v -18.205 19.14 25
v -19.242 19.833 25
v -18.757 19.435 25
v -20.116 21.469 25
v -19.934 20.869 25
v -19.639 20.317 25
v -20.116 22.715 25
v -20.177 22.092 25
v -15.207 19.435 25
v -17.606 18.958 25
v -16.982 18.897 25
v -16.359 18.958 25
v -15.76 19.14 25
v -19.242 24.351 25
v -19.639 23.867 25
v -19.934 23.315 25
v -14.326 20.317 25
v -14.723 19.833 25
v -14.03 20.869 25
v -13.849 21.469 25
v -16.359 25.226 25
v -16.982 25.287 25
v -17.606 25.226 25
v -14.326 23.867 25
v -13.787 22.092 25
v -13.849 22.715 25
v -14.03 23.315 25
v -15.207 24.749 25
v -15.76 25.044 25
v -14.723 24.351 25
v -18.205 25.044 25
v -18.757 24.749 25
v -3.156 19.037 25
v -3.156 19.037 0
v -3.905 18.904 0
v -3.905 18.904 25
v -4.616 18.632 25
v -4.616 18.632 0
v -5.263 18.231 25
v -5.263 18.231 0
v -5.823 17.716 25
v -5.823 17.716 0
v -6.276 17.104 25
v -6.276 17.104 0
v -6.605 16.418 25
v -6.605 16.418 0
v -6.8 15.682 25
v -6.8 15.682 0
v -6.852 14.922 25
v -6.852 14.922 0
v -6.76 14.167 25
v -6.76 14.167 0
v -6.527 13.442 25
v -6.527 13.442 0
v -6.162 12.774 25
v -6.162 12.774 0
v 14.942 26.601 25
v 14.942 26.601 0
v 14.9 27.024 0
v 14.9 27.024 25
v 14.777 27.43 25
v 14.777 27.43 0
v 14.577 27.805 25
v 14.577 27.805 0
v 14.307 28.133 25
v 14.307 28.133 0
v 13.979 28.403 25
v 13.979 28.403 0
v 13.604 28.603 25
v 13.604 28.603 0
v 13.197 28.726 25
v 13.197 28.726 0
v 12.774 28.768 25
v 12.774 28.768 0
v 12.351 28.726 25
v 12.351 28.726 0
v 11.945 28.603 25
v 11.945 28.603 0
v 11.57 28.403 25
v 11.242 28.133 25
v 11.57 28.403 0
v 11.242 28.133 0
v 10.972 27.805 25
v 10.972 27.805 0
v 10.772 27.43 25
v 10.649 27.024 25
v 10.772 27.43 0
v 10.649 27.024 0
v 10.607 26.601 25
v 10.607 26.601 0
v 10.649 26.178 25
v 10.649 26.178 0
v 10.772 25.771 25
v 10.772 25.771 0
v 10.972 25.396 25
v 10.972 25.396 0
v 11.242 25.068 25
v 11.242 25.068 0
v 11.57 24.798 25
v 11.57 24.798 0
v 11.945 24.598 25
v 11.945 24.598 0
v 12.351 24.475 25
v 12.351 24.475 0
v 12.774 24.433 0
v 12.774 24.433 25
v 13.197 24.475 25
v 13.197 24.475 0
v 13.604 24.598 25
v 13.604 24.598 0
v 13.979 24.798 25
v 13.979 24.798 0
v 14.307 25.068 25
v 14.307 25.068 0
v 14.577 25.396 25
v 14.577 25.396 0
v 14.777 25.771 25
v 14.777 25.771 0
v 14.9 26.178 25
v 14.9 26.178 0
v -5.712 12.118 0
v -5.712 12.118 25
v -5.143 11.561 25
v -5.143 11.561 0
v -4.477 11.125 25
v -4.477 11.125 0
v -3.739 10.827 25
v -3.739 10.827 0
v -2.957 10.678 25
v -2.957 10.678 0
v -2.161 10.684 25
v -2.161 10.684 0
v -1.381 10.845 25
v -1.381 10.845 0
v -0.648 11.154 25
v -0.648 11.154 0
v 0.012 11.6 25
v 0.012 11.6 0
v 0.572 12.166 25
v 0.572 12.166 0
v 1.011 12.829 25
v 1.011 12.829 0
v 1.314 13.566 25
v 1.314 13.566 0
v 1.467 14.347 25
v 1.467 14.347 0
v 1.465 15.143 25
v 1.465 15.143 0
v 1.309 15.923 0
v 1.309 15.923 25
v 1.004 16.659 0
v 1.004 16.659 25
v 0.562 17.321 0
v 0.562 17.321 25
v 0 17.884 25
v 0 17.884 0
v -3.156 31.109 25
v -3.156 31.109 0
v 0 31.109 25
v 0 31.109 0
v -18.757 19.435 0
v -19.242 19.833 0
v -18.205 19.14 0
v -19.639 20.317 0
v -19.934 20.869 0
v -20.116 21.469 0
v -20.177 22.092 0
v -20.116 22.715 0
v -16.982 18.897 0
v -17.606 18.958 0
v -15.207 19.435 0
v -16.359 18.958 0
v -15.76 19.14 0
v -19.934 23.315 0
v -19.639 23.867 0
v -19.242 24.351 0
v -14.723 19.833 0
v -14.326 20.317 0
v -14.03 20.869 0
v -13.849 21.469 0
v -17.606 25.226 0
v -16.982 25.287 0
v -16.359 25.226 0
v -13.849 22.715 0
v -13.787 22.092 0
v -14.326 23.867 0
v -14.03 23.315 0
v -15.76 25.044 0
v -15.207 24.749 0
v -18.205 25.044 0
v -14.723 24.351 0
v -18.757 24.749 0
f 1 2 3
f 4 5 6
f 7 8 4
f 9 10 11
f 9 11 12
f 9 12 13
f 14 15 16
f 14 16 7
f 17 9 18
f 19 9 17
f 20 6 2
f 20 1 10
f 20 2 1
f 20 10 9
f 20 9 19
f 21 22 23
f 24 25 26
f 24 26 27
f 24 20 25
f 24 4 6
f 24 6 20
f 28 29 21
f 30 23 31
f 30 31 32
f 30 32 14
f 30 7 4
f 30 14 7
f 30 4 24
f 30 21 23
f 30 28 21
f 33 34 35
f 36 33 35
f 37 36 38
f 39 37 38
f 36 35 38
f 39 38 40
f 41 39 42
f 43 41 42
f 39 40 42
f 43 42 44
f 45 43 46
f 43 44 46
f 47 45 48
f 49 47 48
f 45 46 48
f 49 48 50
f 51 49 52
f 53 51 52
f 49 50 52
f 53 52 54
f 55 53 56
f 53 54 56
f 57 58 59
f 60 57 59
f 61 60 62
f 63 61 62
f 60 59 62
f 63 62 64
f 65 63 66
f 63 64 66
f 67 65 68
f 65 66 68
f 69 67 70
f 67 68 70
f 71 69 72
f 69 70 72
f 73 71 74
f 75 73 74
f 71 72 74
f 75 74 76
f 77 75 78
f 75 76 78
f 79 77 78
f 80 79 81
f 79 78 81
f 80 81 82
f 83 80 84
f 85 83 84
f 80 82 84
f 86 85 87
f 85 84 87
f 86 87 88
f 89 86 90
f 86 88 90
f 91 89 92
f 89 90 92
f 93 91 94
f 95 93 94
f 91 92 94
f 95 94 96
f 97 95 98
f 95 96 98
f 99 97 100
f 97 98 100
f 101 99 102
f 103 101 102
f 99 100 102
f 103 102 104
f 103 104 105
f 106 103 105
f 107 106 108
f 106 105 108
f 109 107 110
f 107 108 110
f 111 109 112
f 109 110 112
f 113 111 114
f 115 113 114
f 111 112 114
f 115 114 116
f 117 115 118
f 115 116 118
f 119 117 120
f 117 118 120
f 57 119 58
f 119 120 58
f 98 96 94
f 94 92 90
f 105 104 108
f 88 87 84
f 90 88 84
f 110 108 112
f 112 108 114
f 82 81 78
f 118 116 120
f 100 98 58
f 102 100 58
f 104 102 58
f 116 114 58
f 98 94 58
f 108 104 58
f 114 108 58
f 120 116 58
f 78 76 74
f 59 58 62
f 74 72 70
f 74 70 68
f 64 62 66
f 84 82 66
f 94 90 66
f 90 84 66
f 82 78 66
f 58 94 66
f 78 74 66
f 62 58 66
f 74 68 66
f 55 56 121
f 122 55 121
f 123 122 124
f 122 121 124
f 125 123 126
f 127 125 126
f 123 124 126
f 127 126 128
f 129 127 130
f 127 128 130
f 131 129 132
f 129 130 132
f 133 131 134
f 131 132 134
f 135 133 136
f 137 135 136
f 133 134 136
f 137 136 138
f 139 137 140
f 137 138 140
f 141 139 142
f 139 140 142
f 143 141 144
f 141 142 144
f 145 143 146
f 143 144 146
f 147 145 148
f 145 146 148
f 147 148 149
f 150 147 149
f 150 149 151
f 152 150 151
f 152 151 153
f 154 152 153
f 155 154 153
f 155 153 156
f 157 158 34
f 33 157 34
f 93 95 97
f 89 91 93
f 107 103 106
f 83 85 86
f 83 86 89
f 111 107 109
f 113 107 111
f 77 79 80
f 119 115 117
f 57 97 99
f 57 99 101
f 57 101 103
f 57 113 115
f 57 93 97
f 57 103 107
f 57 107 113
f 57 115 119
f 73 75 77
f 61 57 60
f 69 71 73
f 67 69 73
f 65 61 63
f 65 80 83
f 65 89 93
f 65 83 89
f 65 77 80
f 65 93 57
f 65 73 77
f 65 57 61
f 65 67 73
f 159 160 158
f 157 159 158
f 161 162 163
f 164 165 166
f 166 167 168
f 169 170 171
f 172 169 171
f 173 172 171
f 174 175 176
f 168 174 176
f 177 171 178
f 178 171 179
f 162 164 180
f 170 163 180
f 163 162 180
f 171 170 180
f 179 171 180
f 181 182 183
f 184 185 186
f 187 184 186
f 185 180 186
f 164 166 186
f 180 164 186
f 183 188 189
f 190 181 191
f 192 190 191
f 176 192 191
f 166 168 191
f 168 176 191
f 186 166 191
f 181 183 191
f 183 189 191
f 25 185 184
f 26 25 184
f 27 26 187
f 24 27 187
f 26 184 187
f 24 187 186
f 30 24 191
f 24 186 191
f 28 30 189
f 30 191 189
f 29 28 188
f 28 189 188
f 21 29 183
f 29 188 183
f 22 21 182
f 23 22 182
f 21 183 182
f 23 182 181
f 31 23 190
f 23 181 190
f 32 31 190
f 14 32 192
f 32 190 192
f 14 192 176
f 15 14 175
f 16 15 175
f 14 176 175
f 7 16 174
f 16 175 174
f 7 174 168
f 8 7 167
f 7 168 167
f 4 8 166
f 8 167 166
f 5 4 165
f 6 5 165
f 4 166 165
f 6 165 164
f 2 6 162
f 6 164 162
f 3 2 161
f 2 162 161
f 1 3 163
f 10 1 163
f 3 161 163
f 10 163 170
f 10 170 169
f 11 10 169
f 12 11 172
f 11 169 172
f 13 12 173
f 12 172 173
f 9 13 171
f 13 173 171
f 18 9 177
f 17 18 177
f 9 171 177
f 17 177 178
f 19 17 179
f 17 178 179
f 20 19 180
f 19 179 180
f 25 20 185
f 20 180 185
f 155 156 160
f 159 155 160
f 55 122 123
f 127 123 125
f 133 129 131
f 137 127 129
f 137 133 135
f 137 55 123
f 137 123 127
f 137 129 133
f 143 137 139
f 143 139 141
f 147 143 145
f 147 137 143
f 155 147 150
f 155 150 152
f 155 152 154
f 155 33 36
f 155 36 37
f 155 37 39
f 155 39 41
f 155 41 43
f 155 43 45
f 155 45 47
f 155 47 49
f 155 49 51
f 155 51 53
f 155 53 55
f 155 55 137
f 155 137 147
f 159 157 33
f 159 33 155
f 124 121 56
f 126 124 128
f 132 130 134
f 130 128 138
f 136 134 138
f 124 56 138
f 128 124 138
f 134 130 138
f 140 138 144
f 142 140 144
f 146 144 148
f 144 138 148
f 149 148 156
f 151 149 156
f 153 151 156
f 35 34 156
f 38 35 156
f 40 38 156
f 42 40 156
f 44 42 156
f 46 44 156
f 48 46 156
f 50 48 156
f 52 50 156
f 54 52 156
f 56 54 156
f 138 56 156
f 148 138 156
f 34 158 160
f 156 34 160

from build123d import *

# Parameters (mm, degrees)
F0_R     = 3.195129
F0_R_2   = 2.167459
F1_DEPTH = 25


with BuildPart() as f1:
    # F0 (on Top) → F1 (new body)
    with BuildSketch(Plane.XY):
        with Locations((-16.982349, 22.092082)):
            Circle(F0_R)
        with Locations((12.774332, 26.600668)):
            Circle(F0_R_2)
        with BuildLine():
            ThreePointArc((-6.161737, 12.774332), (0.011602, 11.600044), (0, 17.884066))
            ThreePointArc((0, 17.884066), (-1.451834, 18.805898), (-3.156013, 19.036909))
            ThreePointArc((-3.156013, 19.036909), (-6.457058, 16.768659), (-6.161737, 12.774332))
        make_face()
        with BuildLine():
            Line((0, 17.884066), (0, 31.109257))
            Line((0, 31.109257), (-3.156013, 31.109257))
            Line((-3.156013, 31.109257), (-3.156013, 19.036909))
            ThreePointArc((-3.156013, 19.036909), (-1.451834, 18.805898), (0, 17.884066))
        make_face()
    extrude(amount=F1_DEPTH)


solid = f1.part
